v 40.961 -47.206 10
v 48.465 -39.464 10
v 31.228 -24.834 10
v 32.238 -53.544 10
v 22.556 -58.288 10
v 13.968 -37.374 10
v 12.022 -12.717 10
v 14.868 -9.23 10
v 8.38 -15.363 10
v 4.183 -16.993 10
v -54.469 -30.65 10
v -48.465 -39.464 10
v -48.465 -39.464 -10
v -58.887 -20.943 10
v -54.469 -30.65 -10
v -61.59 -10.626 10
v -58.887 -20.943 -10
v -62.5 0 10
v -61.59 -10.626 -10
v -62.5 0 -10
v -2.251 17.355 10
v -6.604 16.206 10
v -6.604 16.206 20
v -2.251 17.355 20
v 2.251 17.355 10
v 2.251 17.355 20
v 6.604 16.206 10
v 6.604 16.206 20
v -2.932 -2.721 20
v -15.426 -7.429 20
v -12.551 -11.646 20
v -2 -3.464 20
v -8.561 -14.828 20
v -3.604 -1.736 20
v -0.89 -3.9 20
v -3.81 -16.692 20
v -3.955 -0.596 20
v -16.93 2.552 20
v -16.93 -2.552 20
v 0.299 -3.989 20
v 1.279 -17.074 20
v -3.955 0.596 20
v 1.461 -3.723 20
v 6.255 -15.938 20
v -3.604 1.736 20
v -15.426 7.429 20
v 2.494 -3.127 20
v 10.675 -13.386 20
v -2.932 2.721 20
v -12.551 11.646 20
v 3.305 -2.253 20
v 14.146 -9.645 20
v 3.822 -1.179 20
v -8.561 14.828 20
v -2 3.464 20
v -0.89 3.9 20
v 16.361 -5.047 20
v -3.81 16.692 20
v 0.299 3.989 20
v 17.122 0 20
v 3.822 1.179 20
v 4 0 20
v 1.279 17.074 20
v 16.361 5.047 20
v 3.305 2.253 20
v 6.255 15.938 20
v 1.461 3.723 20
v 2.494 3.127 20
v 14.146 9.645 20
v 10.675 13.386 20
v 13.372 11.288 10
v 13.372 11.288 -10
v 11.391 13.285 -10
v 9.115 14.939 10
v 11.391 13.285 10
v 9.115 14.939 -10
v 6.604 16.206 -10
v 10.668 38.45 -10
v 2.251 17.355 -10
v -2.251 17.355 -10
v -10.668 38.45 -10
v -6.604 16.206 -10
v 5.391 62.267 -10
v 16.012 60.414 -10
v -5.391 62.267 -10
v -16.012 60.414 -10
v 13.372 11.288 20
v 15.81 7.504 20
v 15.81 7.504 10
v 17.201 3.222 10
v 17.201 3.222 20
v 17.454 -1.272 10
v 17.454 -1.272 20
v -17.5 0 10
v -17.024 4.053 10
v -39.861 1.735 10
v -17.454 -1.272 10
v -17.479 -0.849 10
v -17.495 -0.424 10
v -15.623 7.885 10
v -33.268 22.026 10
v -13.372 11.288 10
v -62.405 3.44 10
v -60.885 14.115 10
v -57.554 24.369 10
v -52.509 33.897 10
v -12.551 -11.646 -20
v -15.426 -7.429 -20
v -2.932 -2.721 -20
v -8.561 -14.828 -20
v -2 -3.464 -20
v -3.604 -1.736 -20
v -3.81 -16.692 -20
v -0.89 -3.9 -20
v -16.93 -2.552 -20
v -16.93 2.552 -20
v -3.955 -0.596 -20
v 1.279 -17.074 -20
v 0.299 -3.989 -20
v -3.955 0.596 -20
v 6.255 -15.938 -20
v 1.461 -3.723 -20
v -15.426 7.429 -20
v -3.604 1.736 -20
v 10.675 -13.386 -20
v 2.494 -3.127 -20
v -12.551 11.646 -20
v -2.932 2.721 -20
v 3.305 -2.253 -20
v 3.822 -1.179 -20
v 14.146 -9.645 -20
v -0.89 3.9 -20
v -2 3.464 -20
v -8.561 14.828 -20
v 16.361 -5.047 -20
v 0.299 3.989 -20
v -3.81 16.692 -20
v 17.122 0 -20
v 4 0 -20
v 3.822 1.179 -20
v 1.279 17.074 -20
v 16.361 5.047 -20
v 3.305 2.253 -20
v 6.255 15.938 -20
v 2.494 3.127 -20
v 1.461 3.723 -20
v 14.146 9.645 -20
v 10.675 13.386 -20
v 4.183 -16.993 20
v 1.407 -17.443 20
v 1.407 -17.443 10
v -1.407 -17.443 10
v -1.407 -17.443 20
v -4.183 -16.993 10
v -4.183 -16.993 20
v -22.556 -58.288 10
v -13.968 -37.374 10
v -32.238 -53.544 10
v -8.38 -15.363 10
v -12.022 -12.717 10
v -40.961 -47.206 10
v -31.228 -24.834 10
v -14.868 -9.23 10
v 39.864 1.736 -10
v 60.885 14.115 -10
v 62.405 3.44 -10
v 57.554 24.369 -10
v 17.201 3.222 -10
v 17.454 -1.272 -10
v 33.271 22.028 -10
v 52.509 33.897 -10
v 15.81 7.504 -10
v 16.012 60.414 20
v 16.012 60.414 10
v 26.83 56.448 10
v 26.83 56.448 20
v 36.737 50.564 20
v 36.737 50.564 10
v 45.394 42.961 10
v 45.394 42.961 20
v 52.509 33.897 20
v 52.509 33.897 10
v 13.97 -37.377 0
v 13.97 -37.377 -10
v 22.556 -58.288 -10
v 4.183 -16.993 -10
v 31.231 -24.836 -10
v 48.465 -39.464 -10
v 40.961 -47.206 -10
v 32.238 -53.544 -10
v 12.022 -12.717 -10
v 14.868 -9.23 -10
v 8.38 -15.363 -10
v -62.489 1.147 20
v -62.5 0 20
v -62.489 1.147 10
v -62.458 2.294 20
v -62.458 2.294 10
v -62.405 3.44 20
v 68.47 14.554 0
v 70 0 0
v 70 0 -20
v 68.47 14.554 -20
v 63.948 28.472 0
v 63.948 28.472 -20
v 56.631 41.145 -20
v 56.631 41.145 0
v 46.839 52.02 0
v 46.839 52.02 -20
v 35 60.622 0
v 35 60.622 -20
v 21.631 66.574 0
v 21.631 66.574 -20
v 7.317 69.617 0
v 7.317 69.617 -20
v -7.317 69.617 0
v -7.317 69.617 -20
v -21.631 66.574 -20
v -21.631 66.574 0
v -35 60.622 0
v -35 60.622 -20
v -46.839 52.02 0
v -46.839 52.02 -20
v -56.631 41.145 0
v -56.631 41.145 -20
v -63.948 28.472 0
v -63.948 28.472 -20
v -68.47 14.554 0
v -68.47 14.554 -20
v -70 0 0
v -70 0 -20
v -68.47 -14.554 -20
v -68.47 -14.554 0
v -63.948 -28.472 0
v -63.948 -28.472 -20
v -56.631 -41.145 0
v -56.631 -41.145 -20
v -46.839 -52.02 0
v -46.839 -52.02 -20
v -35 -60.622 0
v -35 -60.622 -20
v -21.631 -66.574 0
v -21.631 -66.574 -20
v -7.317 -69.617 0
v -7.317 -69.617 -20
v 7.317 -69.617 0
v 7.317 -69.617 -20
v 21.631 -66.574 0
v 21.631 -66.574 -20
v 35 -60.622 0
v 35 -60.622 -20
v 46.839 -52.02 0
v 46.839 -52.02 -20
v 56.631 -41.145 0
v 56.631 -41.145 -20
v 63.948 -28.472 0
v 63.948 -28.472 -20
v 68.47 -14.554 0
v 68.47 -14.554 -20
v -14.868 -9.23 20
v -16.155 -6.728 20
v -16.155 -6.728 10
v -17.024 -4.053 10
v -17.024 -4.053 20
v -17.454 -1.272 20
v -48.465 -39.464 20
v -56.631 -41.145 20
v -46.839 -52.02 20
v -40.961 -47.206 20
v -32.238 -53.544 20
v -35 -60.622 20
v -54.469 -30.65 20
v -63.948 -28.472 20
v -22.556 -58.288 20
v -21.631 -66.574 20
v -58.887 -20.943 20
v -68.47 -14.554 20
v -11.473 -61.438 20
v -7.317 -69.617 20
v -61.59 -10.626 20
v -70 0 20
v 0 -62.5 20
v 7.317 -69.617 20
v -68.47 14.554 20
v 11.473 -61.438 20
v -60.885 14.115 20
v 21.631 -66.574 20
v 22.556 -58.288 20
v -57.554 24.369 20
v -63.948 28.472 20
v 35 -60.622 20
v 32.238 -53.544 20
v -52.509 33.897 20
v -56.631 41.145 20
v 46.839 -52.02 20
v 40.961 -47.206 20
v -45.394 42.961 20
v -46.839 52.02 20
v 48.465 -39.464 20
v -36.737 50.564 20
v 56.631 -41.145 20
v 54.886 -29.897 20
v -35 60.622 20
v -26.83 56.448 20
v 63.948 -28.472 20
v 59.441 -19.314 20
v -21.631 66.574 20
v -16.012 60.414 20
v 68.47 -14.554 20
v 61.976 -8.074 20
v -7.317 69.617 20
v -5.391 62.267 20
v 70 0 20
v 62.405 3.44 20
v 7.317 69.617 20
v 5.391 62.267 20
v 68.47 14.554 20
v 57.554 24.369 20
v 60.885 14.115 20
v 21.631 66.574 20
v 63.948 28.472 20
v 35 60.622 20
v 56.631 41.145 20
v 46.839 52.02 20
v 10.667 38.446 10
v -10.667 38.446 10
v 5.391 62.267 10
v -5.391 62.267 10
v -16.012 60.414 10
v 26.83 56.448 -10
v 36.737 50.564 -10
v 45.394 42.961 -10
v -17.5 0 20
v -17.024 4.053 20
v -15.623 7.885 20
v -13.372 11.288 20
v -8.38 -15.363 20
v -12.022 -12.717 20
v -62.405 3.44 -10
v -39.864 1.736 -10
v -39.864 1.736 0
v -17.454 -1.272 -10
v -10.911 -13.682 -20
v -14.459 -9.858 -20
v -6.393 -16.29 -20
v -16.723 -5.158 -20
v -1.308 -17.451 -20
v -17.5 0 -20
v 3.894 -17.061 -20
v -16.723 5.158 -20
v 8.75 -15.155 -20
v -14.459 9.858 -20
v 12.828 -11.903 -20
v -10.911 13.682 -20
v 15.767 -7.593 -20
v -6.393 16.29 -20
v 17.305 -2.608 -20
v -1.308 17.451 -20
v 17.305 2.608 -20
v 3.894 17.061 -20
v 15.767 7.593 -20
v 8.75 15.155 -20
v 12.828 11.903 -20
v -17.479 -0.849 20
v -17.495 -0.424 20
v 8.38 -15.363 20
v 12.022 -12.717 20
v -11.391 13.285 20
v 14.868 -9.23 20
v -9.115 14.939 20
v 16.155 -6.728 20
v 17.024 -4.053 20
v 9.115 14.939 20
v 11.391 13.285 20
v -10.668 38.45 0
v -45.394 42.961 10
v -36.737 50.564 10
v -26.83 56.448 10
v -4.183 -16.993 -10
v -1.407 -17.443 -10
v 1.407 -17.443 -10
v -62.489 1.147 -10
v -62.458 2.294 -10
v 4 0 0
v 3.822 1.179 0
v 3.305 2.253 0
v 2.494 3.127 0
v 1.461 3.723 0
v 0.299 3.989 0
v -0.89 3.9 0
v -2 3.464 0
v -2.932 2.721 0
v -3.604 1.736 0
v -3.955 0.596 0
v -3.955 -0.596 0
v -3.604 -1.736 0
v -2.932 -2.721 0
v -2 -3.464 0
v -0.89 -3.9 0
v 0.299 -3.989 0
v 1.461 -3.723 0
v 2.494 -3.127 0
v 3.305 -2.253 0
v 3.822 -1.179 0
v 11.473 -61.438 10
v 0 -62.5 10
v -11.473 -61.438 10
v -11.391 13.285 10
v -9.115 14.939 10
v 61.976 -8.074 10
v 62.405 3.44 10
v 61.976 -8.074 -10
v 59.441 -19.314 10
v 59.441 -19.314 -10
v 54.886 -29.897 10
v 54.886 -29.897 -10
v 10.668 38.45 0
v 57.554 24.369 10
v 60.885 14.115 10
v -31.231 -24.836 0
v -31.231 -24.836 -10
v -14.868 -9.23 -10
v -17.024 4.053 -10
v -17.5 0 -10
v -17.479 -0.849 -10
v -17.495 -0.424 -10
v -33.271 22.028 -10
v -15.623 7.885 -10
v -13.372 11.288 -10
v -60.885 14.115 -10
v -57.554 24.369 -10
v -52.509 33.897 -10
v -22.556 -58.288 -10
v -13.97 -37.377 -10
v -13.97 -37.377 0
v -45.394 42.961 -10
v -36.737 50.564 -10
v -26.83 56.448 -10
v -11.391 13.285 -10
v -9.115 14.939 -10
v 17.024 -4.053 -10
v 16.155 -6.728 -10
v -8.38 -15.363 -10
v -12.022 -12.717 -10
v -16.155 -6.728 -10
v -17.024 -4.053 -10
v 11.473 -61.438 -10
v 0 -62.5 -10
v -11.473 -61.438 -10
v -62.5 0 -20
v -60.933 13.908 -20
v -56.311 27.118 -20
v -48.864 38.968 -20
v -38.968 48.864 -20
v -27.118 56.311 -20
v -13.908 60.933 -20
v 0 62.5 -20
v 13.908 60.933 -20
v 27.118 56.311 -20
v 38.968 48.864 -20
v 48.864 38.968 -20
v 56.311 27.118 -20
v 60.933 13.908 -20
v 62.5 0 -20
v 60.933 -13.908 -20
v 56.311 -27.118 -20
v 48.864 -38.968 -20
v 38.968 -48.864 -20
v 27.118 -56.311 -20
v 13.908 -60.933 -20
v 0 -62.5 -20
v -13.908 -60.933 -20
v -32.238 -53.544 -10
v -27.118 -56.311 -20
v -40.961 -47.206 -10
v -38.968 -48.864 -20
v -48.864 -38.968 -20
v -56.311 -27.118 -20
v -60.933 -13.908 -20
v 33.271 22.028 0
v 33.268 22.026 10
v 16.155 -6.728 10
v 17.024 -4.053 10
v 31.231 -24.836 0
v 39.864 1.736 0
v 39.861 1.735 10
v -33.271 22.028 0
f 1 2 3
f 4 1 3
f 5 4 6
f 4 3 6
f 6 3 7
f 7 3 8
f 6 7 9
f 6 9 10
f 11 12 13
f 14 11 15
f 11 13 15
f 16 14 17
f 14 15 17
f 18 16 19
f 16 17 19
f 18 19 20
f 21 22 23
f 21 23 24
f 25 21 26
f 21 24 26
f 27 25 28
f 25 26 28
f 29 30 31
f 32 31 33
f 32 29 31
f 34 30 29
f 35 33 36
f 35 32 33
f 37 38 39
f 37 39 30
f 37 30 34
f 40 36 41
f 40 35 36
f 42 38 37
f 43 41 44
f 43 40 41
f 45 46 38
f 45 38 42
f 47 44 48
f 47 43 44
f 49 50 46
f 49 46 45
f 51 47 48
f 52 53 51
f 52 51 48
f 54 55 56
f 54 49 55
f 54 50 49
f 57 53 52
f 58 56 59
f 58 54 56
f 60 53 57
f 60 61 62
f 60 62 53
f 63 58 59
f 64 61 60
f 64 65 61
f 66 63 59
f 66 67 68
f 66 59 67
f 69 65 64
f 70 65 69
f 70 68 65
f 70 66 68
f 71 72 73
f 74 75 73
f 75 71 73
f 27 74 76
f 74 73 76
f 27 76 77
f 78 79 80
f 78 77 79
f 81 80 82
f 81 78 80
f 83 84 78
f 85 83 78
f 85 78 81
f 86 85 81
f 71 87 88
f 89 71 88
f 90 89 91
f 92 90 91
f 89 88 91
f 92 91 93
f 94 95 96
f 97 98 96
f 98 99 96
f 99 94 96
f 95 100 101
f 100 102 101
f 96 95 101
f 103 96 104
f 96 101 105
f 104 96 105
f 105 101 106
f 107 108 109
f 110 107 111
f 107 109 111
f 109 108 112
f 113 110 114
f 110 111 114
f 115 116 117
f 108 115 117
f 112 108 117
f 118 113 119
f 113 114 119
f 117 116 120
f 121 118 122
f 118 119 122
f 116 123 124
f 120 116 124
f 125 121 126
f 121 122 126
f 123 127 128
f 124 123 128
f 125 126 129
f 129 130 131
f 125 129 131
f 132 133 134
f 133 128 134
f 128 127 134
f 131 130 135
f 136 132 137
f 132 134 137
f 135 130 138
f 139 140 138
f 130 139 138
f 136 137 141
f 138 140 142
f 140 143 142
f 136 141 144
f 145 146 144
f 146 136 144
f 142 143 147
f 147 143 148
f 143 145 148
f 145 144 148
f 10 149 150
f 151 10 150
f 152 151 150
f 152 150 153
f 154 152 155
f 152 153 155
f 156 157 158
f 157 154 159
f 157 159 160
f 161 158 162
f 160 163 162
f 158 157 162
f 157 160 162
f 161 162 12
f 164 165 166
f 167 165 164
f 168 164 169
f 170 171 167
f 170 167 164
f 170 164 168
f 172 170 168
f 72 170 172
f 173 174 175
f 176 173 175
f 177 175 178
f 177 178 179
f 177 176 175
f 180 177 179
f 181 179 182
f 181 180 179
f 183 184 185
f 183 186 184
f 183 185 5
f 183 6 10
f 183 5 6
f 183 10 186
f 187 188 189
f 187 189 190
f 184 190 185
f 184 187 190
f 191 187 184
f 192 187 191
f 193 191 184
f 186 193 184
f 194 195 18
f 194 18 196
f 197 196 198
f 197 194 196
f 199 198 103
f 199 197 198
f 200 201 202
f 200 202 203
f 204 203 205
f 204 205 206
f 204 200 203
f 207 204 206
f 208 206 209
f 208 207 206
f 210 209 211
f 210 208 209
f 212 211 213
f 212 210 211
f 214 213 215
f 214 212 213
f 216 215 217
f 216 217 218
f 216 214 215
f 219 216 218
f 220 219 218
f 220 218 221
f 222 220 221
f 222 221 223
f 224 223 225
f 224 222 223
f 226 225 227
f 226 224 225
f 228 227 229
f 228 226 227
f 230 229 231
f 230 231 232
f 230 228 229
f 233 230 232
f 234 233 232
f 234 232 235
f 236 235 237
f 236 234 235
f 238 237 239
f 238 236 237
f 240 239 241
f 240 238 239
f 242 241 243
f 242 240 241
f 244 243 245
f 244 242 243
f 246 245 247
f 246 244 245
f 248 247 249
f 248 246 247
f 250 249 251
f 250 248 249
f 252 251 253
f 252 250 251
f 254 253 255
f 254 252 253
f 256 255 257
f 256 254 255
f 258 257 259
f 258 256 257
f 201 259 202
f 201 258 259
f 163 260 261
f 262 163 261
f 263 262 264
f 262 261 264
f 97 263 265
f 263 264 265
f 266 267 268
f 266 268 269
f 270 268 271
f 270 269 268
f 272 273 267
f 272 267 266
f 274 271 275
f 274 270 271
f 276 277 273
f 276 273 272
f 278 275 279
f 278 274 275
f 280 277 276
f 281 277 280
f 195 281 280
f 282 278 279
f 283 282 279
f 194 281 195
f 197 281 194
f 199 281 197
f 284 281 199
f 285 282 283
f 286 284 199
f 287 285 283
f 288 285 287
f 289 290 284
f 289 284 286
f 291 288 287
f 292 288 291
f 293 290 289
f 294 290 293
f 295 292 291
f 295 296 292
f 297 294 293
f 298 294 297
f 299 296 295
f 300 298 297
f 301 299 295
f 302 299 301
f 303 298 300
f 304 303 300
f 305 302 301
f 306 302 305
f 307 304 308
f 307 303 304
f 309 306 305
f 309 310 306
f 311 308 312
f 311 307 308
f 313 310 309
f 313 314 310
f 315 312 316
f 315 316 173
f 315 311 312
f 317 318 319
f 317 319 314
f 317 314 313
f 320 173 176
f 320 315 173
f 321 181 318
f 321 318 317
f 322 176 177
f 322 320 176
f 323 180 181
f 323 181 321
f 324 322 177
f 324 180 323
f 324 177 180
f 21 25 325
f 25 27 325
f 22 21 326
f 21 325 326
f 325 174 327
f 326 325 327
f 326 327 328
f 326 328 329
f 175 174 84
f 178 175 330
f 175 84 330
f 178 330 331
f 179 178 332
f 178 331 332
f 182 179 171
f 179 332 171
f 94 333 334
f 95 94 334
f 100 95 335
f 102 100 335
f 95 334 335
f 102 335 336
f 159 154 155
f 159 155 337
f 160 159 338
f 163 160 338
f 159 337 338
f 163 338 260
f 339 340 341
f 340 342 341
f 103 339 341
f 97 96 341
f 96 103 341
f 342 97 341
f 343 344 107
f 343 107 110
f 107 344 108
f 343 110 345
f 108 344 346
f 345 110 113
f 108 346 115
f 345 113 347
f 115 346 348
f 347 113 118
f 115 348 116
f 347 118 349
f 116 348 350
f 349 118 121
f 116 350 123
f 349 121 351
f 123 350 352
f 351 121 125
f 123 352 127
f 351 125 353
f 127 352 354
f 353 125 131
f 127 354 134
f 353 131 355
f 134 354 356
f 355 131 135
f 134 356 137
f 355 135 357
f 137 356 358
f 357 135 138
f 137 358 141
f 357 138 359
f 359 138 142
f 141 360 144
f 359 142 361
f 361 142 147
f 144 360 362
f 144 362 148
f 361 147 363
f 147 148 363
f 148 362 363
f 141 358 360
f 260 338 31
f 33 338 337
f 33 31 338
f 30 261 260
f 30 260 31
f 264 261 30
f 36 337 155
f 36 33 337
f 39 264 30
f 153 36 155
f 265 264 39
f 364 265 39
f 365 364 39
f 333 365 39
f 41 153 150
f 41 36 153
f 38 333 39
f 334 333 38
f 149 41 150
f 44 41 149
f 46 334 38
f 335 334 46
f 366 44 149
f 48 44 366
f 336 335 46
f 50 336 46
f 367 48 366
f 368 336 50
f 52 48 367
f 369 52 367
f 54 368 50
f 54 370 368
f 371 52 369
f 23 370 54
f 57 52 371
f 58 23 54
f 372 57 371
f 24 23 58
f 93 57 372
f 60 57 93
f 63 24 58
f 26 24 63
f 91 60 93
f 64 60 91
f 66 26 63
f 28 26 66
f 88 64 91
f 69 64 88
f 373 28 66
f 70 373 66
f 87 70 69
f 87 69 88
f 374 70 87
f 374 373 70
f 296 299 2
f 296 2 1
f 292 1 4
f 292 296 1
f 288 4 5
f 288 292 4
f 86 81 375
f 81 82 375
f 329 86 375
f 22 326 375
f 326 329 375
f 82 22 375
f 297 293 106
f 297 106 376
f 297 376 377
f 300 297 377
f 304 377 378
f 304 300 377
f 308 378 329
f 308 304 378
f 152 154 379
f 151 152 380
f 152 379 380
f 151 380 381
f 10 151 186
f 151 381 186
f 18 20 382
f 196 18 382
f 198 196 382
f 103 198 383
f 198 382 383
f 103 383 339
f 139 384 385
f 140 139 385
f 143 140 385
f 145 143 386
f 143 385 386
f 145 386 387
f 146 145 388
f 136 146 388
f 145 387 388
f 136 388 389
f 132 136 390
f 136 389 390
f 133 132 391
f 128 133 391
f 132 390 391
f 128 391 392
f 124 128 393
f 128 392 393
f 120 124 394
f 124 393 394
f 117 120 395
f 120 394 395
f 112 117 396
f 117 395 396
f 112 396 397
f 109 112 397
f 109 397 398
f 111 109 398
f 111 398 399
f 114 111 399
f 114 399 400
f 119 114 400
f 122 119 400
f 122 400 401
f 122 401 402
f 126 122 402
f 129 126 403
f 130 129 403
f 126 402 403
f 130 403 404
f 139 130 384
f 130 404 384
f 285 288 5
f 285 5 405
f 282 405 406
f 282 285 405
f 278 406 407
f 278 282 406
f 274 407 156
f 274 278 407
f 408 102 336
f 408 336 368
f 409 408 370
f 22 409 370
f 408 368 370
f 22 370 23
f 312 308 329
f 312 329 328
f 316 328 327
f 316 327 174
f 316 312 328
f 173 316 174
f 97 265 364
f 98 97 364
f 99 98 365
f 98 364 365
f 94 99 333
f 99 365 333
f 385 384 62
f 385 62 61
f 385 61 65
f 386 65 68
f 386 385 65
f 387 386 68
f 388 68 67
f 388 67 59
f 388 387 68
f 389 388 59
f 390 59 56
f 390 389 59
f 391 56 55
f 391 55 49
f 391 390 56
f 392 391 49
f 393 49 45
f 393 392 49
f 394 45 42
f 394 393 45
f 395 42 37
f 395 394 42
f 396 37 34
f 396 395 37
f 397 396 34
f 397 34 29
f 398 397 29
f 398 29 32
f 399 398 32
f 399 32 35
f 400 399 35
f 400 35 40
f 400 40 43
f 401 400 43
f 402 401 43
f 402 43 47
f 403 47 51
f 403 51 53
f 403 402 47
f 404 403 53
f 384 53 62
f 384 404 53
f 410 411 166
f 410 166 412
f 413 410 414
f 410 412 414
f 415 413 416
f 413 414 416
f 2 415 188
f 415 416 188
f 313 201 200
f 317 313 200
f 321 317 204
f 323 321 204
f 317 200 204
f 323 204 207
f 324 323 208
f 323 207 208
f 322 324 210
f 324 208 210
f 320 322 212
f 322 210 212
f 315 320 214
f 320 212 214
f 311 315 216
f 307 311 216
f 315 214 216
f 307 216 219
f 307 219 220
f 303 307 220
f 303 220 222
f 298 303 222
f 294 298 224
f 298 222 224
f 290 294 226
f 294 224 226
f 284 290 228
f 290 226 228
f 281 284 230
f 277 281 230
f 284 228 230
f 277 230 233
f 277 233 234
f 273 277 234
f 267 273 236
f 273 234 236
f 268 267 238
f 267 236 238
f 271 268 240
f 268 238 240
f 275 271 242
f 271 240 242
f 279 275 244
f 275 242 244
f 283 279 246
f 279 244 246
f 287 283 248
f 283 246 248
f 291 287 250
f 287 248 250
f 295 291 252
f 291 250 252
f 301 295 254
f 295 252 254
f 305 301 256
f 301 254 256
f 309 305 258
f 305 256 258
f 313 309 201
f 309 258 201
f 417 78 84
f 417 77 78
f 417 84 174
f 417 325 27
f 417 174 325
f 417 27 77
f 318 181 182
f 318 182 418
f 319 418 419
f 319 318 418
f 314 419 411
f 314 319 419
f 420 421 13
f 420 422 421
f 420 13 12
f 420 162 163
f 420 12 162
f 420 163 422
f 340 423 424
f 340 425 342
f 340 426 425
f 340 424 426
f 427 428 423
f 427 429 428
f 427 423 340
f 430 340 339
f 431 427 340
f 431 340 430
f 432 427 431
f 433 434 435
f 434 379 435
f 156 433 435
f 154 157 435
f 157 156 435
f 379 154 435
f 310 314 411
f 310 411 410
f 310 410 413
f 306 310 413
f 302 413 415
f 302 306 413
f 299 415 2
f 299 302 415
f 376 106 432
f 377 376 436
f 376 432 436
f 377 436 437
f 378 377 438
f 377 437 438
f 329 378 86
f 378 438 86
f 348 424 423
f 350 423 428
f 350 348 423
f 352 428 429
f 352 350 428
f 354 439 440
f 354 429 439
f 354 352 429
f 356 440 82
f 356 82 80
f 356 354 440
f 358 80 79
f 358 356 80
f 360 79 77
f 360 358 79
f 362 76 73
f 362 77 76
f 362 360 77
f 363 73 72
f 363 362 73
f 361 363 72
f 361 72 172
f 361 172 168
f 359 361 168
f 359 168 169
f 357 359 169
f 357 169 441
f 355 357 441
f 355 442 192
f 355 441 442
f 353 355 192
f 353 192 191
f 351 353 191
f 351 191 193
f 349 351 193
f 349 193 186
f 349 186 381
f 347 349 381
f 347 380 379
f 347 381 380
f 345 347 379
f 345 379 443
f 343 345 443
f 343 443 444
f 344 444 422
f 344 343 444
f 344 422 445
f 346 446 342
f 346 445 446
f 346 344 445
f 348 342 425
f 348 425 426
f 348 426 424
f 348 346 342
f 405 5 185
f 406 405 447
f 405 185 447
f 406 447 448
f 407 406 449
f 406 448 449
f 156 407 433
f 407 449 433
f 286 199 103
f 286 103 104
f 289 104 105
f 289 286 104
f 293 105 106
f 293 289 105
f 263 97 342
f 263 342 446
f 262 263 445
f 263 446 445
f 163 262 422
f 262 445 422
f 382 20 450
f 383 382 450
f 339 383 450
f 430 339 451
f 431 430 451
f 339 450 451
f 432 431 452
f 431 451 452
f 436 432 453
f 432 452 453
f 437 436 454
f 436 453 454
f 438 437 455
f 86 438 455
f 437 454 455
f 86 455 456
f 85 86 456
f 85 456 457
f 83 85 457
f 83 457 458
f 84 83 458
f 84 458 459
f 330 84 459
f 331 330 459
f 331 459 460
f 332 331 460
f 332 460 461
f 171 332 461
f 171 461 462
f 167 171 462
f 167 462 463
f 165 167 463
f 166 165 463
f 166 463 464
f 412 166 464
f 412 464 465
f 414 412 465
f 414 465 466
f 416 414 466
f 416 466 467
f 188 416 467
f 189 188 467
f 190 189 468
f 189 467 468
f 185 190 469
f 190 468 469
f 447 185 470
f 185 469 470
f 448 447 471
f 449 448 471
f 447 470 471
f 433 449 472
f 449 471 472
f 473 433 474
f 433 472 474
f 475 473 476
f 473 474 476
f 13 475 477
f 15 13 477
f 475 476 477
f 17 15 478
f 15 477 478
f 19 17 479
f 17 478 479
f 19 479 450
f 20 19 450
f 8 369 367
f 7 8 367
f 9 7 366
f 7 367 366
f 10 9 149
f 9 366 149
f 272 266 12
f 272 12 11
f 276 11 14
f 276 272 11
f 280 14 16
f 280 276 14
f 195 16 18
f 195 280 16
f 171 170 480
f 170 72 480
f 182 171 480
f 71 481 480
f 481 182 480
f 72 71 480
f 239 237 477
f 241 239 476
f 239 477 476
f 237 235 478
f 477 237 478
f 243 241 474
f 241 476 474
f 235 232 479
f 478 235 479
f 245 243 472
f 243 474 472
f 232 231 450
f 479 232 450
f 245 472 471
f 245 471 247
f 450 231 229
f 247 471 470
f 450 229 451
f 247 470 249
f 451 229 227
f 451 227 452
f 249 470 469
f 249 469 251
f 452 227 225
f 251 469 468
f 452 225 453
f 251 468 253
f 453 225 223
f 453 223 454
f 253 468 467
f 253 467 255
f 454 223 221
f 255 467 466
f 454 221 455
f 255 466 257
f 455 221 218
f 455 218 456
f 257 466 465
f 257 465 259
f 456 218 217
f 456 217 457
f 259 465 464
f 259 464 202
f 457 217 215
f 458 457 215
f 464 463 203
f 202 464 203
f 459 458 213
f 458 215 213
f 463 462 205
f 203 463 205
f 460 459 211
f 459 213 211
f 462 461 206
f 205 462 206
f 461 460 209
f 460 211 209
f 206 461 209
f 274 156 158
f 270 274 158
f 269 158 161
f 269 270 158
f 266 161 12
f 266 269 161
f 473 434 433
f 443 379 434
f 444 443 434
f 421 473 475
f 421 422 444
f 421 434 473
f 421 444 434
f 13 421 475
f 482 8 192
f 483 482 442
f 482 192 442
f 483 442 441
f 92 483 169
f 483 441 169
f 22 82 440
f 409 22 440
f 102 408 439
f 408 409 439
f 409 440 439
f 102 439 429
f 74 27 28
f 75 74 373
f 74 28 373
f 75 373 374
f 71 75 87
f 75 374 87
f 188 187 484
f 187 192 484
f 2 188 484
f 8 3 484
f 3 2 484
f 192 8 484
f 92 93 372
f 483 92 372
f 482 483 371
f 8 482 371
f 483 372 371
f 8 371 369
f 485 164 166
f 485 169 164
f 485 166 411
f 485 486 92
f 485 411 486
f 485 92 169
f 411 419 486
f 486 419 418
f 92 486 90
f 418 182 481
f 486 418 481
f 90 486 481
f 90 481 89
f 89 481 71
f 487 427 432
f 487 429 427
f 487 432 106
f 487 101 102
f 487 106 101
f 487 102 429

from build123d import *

# Parameters (mm, degrees)
SKETCH1_R           = 70
SKETCH1_R_2         = 62.278635001
SKETCH1_R_3         = 17.121532135
SKETCH1_R_4         = 4
BOSS_EXTRUDE1_DEPTH = 20
SKETCH2_R           = 62.5
SKETCH2_R_2         = 17.5
CUT_EXTRUDE1_DEPTH  = 10
CUT_EXTRUDE2_DEPTH  = 104.440804328


with BuildPart() as part:
    # Sketch1 → Boss-Extrude1 (new, symmetric)
    # profile 1 of 3: a face of its own
    with BuildSketch(Plane.XY):
        Circle(SKETCH1_R)
        Circle(SKETCH1_R_2, mode=Mode.SUBTRACT)
    # profile 2 of 3: a face of its own
    with BuildSketch(Plane.XY):
        Circle(SKETCH1_R_2)
        Circle(SKETCH1_R_3, mode=Mode.SUBTRACT)
    # profile 3 of 3: a face of its own
    with BuildSketch(Plane.XY):
        Circle(SKETCH1_R_3)
        Circle(SKETCH1_R_4, mode=Mode.SUBTRACT)
    extrude(amount=BOSS_EXTRUDE1_DEPTH, both=True)

    # Sketch2 → Cut-Extrude1 (cut)
    with BuildSketch(Plane(origin=(0, 0, -20), x_dir=(-1, 0, 0), z_dir=(0, 0, -1))):
        Circle(SKETCH2_R)
        Circle(SKETCH2_R_2, mode=Mode.SUBTRACT)
    cut_extrude1 = extrude(amount=-CUT_EXTRUDE1_DEPTH, mode=Mode.SUBTRACT)

    # Mirror1: Cut-Extrude1 across plane
    add(cut_extrude1.mirror(Plane.XY), mode=Mode.SUBTRACT)

    # Sketch3 → Cut-Extrude2 (cut, through all)
    with BuildSketch(Plane(origin=(0, 0, -10), x_dir=(-1, 0, 0), z_dir=(0, 0, -1))):
        with BuildLine():
            add(Edge.make_bspline(
                [(-16.012184604, 60.414070747), (-10.028198069, 38.589231507), (-6.603566708, 16.206261343)],
                knots=[0, 0, 0, 1, 1, 1], degree=2))
            ThreePointArc((-16.012184604, 60.414070747), (-36.736578268, 50.563562148), (-52.5091585, 33.897467068))
            add(Edge.make_bspline(
                [(-52.5091585, 33.897467068), (-33.601656457, 21.462111455), (-13.372456119, 11.288375319)],
                knots=[0, 0, 0, 1, 1, 1], degree=2))
            ThreePointArc((-13.372456119, 11.288375319), (-10.286241915, 14.157797402), (-6.603566708, 16.206261343))
        make_face()
        with BuildLine():
            add(Edge.make_bspline(
                [(52.5091585, 33.897467068), (33.601656457, 21.462111455), (13.372456119, 11.288375319)],
                knots=[0, 0, 0, 1, 1, 1], degree=2))
            ThreePointArc((52.5091585, 33.897467068), (36.736578268, 50.563562148), (16.012184604, 60.414070747))
            add(Edge.make_bspline(
                [(16.012184604, 60.414070747), (10.028198069, 38.589231507), (6.603566708, 16.206261343)],
                knots=[0, 0, 0, 1, 1, 1], degree=2))
            ThreePointArc((6.603566708, 16.206261343), (10.286241915, 14.157797402), (13.372456119, 11.288375319))
        make_face()
        with BuildLine():
            ThreePointArc((48.464629278, -39.464283966), (58.886710427, -20.942906557), (62.5, 0))
            ThreePointArc((62.5, 0), (62.476303713, 1.720893487), (62.405232819, 3.440482052))
            add(Edge.make_bspline(
                [(62.405232819, 3.440482052), (39.79942371, 2.387345216), (17.453684792, -1.272354978)],
                knots=[0, 0, 0, 1, 1, 1], degree=2))
            ThreePointArc((17.453684792, -1.272354978), (16.643489035, -5.407797402), (14.868199103, -9.229661719))
            add(Edge.make_bspline(
                [(48.464629278, -39.464283966), (30.795163838, -25.324917157), (14.868199103, -9.229661719)],
                knots=[0, 0, 0, 1, 1, 1], degree=2))
        make_face()
        with BuildLine():
            ThreePointArc((-62.405232819, 3.440482052), (-59.441032268, -19.313562148), (-48.464629278, -39.464283966))
            add(Edge.make_bspline(
                [(-48.464629278, -39.464283966), (-30.795163838, -25.324917157), (-14.868199103, -9.229661719)],
                knots=[0, 0, 0, 1, 1, 1], degree=2))
            ThreePointArc((-14.868199103, -9.229661719), (-16.643489035, -5.407797402), (-17.453684792, -1.272354978))
            add(Edge.make_bspline(
                [(-62.405232819, 3.440482052), (-39.79942371, 2.387345216), (-17.453684792, -1.272354978)],
                knots=[0, 0, 0, 1, 1, 1], degree=2))
        make_face()
        with BuildLine():
            ThreePointArc((-22.556370354, -58.287735901), (0, -62.5), (22.556370354, -58.287735901))
            add(Edge.make_bspline(
                [(22.556370354, -58.287735901), (14.569198516, -37.113771021), (4.183403722, -16.992619966)],
                knots=[0, 0, 0, 1, 1, 1], degree=2))
            ThreePointArc((4.183403722, -16.992619966), (0, -17.5), (-4.183403722, -16.992619966))
            add(Edge.make_bspline(
                [(-22.556370354, -58.287735901), (-14.569198516, -37.113771021), (-4.183403722, -16.992619966)],
                knots=[0, 0, 0, 1, 1, 1], degree=2))
        make_face()
    extrude(amount=-CUT_EXTRUDE2_DEPTH, mode=Mode.SUBTRACT)


solid = part.part
